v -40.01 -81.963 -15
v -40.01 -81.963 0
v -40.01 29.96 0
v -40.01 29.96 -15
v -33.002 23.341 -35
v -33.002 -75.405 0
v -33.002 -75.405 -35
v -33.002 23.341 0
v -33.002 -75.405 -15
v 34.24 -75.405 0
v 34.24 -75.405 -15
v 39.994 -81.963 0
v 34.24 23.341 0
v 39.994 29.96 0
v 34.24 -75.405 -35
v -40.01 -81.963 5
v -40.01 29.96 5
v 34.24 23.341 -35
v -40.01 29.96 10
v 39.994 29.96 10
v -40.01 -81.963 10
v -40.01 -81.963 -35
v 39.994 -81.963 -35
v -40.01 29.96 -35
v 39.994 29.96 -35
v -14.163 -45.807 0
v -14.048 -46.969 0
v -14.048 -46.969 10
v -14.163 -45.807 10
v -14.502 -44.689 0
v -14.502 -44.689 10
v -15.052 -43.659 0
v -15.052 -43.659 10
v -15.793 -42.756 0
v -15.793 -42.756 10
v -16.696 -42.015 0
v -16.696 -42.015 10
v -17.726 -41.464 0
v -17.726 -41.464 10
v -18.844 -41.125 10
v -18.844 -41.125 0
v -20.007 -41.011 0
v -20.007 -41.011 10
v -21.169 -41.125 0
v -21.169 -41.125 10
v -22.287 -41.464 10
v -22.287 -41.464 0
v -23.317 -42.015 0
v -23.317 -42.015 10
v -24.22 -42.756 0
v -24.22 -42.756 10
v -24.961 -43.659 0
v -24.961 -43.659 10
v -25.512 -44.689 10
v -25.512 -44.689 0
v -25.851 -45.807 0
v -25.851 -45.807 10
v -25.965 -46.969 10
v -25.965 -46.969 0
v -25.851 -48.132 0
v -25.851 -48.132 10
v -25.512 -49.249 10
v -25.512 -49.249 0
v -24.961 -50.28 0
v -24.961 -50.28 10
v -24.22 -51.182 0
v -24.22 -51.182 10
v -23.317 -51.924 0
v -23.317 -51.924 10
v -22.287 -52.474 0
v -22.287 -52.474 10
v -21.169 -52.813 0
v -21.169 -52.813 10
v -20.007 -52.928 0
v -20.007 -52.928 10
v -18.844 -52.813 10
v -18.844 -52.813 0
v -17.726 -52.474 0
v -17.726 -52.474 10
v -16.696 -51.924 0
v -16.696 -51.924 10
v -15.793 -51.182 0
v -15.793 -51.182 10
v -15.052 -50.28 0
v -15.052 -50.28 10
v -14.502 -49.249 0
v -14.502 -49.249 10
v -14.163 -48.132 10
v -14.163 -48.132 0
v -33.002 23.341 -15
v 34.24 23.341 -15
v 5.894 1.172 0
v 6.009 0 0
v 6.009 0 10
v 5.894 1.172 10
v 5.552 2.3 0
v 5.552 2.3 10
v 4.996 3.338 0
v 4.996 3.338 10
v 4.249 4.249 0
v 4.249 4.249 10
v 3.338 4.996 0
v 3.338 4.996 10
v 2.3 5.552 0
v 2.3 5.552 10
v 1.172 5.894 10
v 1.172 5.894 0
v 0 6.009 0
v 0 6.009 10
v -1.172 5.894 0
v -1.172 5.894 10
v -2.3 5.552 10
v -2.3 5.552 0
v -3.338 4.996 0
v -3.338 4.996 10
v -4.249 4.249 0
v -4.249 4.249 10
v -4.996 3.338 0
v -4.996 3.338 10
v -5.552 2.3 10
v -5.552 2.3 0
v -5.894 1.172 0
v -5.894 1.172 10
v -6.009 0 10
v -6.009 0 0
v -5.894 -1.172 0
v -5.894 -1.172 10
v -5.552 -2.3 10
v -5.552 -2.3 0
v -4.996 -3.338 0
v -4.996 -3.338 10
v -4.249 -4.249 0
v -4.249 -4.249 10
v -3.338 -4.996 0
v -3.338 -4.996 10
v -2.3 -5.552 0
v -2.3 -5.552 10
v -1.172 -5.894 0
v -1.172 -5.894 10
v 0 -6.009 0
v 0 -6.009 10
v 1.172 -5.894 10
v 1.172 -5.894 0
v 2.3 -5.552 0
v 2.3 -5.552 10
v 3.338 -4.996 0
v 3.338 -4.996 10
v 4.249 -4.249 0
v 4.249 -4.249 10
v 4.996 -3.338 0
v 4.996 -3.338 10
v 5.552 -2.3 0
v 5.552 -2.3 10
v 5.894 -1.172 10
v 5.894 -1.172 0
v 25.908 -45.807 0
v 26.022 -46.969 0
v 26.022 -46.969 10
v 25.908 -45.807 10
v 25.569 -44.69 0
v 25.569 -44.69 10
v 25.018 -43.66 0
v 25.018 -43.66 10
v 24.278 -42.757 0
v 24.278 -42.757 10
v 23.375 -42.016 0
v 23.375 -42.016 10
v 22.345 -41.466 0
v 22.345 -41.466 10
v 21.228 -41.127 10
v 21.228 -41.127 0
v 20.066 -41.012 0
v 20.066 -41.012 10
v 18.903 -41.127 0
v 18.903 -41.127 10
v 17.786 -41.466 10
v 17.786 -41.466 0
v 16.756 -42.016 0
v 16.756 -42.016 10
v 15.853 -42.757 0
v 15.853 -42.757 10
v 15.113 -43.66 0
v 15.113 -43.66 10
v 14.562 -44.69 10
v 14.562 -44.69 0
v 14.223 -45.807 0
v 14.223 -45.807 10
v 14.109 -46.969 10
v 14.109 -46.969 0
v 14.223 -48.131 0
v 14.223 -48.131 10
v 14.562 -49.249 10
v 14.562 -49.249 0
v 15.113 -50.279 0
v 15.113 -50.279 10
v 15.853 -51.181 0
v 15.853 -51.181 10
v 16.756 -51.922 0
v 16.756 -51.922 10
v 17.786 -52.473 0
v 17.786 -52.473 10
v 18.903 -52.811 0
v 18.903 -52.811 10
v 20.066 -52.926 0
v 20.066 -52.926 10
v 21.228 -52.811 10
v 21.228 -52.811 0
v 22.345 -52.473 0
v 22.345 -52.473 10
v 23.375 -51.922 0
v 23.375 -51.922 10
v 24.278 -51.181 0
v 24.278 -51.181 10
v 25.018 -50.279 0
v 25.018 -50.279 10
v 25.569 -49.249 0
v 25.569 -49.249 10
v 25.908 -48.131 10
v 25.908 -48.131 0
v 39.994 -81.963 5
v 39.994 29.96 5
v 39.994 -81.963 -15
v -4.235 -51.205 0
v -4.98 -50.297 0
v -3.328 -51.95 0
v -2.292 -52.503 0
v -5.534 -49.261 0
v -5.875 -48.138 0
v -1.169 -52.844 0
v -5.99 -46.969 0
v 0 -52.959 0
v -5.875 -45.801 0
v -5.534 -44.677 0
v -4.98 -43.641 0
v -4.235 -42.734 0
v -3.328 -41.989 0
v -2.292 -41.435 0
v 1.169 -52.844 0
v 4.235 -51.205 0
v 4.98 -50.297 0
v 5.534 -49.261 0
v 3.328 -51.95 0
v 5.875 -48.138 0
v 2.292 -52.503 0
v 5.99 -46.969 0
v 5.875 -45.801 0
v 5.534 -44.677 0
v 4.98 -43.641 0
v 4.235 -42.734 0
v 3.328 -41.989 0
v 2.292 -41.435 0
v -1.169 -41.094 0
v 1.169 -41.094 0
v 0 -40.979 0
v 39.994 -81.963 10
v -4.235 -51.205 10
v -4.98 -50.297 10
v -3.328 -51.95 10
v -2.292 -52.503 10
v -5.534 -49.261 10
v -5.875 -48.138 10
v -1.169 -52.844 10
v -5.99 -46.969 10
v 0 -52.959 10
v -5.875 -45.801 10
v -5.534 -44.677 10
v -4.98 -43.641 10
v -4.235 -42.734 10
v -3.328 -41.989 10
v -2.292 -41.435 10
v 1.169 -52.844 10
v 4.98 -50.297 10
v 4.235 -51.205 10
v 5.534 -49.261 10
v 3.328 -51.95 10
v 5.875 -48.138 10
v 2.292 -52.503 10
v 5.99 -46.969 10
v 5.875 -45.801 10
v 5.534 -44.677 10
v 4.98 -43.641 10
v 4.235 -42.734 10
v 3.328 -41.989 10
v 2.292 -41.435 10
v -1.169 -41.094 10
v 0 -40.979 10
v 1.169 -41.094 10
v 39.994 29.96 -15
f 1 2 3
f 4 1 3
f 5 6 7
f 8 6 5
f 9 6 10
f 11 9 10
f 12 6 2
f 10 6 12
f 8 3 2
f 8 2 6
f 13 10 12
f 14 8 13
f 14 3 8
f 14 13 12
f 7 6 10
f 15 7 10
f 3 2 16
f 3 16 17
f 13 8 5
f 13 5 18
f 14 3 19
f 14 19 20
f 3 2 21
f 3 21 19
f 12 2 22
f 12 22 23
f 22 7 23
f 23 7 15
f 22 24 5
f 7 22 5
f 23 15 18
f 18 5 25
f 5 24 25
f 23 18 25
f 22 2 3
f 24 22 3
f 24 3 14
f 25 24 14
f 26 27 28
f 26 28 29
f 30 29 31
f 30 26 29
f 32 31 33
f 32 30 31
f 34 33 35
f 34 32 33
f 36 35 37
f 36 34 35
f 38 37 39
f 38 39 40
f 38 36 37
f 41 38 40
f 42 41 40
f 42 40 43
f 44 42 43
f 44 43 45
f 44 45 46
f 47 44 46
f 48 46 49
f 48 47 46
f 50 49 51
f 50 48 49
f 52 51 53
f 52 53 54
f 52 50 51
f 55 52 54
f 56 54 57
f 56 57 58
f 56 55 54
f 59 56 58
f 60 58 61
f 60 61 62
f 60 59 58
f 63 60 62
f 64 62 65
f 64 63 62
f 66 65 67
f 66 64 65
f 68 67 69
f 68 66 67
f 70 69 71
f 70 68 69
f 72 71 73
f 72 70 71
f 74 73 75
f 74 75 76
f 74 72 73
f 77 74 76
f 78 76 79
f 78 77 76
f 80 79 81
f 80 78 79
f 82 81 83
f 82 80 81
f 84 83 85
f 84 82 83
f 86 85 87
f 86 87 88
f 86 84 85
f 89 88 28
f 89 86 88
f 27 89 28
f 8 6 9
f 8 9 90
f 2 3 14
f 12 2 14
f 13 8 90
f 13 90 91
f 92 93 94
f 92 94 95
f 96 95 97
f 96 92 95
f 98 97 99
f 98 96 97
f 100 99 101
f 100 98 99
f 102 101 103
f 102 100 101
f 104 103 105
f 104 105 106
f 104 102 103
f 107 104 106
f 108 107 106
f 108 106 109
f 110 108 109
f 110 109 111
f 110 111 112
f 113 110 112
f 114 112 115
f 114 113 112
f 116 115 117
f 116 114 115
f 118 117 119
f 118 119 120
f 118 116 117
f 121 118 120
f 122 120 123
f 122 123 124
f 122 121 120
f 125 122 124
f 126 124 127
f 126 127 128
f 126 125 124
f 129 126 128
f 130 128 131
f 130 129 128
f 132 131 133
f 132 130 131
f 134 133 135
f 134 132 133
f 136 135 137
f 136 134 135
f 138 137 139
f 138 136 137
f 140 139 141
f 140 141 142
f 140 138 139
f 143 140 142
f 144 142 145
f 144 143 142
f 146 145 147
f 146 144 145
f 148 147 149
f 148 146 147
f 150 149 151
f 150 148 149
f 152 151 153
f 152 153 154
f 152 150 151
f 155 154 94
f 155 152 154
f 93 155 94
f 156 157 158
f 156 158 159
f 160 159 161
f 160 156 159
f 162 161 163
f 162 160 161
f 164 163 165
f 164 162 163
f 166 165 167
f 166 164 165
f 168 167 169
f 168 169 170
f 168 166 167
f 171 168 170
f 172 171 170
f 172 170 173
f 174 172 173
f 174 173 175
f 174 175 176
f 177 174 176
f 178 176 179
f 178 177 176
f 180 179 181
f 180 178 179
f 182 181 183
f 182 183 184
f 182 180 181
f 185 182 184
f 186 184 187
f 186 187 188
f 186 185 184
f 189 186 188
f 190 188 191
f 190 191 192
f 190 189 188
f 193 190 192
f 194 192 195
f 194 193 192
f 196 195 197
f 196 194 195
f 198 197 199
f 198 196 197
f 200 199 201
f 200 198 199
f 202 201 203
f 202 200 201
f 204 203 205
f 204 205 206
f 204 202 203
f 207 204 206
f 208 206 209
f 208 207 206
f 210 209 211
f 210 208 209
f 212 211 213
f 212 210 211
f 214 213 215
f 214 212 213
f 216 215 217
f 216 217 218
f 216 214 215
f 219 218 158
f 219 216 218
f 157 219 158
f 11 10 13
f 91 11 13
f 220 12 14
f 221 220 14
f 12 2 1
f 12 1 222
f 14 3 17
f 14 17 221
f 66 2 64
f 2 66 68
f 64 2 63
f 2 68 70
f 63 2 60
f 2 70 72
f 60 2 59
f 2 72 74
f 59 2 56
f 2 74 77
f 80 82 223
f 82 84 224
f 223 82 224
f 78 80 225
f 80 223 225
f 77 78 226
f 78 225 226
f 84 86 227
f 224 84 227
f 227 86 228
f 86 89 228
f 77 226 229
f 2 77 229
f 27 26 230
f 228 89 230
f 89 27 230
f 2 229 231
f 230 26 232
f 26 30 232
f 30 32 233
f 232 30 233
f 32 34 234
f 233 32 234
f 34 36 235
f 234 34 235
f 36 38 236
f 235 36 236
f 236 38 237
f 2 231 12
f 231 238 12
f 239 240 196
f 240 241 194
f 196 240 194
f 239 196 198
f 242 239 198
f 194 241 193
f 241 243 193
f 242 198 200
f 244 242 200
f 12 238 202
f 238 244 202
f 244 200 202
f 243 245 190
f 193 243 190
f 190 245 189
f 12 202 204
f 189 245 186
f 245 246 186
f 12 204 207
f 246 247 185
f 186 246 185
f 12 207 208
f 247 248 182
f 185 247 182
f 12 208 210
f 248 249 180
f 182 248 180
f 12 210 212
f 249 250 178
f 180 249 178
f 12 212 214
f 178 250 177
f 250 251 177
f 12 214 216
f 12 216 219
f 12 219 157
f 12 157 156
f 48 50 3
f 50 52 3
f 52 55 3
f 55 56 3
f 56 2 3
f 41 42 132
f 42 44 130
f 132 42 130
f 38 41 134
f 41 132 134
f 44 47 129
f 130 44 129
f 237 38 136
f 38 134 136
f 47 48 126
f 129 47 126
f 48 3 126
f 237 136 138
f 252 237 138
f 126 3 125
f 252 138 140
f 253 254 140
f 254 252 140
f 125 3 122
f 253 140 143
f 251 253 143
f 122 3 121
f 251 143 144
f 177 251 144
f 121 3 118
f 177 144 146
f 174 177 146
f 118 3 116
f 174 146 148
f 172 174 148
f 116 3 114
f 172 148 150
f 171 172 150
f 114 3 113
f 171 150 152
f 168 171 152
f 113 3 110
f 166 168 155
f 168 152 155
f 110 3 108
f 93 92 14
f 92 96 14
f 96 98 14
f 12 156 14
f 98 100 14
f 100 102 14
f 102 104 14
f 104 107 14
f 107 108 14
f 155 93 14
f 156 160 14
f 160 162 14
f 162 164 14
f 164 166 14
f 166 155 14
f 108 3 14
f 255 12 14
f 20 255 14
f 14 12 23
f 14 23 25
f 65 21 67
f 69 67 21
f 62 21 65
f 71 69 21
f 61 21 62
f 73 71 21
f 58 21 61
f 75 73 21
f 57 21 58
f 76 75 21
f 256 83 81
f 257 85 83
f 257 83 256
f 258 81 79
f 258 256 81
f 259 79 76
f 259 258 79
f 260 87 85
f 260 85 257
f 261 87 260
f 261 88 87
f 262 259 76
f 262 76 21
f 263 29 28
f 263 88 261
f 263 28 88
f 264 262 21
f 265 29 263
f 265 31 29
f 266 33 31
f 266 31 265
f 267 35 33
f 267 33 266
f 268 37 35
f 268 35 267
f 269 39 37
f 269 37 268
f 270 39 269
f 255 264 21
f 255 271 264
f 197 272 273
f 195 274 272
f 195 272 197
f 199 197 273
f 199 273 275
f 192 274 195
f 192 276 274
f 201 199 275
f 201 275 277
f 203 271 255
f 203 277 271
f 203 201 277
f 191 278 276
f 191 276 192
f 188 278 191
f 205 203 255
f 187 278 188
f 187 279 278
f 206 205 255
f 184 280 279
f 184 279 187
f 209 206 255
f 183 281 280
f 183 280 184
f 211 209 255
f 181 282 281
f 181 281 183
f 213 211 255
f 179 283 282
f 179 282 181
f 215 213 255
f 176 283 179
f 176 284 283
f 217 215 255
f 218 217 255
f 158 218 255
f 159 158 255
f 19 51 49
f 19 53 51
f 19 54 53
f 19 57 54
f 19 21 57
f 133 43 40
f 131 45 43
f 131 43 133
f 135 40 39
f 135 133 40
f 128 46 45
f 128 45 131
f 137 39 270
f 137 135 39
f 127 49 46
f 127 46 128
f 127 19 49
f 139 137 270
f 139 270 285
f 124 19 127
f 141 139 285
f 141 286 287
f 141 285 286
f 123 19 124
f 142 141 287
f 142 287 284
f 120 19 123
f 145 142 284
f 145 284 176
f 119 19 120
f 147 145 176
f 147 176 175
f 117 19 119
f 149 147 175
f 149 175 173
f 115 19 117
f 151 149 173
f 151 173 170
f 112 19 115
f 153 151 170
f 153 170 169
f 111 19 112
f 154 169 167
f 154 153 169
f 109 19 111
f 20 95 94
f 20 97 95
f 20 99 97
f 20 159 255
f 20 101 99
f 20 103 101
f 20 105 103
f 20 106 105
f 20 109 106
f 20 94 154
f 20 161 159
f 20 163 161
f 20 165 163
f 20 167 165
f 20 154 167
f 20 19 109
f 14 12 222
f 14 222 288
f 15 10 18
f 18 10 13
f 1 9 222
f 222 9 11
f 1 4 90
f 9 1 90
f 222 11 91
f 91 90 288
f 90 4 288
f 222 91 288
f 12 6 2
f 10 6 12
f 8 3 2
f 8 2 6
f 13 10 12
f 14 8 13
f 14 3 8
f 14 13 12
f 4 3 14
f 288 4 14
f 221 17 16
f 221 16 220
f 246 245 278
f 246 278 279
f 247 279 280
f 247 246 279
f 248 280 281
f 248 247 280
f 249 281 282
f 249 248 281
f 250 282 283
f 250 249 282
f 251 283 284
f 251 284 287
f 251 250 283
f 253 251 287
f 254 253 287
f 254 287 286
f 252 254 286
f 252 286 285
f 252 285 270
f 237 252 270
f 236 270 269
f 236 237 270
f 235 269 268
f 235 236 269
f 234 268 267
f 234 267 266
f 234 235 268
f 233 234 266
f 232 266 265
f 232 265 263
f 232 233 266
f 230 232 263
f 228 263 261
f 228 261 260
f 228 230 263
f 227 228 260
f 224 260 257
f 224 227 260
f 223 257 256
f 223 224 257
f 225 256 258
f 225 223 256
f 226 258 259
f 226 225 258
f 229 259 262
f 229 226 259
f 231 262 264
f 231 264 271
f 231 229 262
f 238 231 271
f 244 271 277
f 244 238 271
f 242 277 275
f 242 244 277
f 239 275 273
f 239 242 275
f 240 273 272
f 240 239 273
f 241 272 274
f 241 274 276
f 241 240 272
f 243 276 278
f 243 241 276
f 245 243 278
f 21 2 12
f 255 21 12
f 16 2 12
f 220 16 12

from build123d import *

# Parameters (mm, degrees)
SKETCH_W      = 80.004261
SKETCH_H      = 111.923284
SKETCH_R      = 6.009136
SKETCH_R_2    = 5.989882
SKETCH_R_3    = 5.956767
SKETCH_R_4    = 5.958532
PAD_DEPTH     = 10
SKETCH001_W   = 80.004261
SKETCH001_H   = 111.923284
SKETCH001_W_2 = 67.24239
SKETCH001_H_2 = 98.745722
PAD001_DEPTH  = 35
SKETCH003_W   = 80.004261
SKETCH003_H   = 111.923284
SKETCH003_W_2 = 67.24239
SKETCH003_H_2 = 98.745722
PAD003_DEPTH  = 15
SKETCH002_W   = 80.004261
SKETCH002_H   = 111.923284
PAD002_DEPTH  = 5


with BuildPart() as body:
    # Sketch → Pad (new body)
    with BuildSketch(Plane.XY):
        with Locations((-0.007769, -26.001157)):
            Rectangle(SKETCH_W, SKETCH_H)
        Circle(SKETCH_R, mode=Mode.SUBTRACT)
        with Locations((0, -46.969181)):
            Circle(SKETCH_R_2, mode=Mode.SUBTRACT)
        with Locations((20.065542, -46.969181)):
            Circle(SKETCH_R_3, mode=Mode.SUBTRACT)
        with Locations((-20.006693, -46.969181)):
            Circle(SKETCH_R_4, mode=Mode.SUBTRACT)
    extrude(amount=PAD_DEPTH)


with BuildPart() as body001:
    # Sketch001 → Pad001 (new body)
    with BuildSketch(Plane.XY):
        with Locations((-0.007769, -26.001157)):
            Rectangle(SKETCH001_W, SKETCH001_H)
        with Locations((0.619291, -26.032123)):
            Rectangle(SKETCH001_W_2, SKETCH001_H_2, mode=Mode.SUBTRACT)
    extrude(amount=-PAD001_DEPTH)


with BuildPart() as body002:
    # Sketch003 → Pad003 (new body)
    with BuildSketch(Plane.XY):
        with Locations((-0.007769, -26.001157)):
            Rectangle(SKETCH003_W, SKETCH003_H)
        with Locations((0.619291, -26.032123)):
            Rectangle(SKETCH003_W_2, SKETCH003_H_2, mode=Mode.SUBTRACT)
    extrude(amount=-PAD003_DEPTH)


with BuildPart() as body003:
    # Sketch002 → Pad002 (new body)
    with BuildSketch(Plane.XY):
        with Locations((-0.007769, -26.001157)):
            Rectangle(SKETCH002_W, SKETCH002_H)
    extrude(amount=PAD002_DEPTH)


solid = Compound([body.part, body001.part, body002.part, body003.part])
